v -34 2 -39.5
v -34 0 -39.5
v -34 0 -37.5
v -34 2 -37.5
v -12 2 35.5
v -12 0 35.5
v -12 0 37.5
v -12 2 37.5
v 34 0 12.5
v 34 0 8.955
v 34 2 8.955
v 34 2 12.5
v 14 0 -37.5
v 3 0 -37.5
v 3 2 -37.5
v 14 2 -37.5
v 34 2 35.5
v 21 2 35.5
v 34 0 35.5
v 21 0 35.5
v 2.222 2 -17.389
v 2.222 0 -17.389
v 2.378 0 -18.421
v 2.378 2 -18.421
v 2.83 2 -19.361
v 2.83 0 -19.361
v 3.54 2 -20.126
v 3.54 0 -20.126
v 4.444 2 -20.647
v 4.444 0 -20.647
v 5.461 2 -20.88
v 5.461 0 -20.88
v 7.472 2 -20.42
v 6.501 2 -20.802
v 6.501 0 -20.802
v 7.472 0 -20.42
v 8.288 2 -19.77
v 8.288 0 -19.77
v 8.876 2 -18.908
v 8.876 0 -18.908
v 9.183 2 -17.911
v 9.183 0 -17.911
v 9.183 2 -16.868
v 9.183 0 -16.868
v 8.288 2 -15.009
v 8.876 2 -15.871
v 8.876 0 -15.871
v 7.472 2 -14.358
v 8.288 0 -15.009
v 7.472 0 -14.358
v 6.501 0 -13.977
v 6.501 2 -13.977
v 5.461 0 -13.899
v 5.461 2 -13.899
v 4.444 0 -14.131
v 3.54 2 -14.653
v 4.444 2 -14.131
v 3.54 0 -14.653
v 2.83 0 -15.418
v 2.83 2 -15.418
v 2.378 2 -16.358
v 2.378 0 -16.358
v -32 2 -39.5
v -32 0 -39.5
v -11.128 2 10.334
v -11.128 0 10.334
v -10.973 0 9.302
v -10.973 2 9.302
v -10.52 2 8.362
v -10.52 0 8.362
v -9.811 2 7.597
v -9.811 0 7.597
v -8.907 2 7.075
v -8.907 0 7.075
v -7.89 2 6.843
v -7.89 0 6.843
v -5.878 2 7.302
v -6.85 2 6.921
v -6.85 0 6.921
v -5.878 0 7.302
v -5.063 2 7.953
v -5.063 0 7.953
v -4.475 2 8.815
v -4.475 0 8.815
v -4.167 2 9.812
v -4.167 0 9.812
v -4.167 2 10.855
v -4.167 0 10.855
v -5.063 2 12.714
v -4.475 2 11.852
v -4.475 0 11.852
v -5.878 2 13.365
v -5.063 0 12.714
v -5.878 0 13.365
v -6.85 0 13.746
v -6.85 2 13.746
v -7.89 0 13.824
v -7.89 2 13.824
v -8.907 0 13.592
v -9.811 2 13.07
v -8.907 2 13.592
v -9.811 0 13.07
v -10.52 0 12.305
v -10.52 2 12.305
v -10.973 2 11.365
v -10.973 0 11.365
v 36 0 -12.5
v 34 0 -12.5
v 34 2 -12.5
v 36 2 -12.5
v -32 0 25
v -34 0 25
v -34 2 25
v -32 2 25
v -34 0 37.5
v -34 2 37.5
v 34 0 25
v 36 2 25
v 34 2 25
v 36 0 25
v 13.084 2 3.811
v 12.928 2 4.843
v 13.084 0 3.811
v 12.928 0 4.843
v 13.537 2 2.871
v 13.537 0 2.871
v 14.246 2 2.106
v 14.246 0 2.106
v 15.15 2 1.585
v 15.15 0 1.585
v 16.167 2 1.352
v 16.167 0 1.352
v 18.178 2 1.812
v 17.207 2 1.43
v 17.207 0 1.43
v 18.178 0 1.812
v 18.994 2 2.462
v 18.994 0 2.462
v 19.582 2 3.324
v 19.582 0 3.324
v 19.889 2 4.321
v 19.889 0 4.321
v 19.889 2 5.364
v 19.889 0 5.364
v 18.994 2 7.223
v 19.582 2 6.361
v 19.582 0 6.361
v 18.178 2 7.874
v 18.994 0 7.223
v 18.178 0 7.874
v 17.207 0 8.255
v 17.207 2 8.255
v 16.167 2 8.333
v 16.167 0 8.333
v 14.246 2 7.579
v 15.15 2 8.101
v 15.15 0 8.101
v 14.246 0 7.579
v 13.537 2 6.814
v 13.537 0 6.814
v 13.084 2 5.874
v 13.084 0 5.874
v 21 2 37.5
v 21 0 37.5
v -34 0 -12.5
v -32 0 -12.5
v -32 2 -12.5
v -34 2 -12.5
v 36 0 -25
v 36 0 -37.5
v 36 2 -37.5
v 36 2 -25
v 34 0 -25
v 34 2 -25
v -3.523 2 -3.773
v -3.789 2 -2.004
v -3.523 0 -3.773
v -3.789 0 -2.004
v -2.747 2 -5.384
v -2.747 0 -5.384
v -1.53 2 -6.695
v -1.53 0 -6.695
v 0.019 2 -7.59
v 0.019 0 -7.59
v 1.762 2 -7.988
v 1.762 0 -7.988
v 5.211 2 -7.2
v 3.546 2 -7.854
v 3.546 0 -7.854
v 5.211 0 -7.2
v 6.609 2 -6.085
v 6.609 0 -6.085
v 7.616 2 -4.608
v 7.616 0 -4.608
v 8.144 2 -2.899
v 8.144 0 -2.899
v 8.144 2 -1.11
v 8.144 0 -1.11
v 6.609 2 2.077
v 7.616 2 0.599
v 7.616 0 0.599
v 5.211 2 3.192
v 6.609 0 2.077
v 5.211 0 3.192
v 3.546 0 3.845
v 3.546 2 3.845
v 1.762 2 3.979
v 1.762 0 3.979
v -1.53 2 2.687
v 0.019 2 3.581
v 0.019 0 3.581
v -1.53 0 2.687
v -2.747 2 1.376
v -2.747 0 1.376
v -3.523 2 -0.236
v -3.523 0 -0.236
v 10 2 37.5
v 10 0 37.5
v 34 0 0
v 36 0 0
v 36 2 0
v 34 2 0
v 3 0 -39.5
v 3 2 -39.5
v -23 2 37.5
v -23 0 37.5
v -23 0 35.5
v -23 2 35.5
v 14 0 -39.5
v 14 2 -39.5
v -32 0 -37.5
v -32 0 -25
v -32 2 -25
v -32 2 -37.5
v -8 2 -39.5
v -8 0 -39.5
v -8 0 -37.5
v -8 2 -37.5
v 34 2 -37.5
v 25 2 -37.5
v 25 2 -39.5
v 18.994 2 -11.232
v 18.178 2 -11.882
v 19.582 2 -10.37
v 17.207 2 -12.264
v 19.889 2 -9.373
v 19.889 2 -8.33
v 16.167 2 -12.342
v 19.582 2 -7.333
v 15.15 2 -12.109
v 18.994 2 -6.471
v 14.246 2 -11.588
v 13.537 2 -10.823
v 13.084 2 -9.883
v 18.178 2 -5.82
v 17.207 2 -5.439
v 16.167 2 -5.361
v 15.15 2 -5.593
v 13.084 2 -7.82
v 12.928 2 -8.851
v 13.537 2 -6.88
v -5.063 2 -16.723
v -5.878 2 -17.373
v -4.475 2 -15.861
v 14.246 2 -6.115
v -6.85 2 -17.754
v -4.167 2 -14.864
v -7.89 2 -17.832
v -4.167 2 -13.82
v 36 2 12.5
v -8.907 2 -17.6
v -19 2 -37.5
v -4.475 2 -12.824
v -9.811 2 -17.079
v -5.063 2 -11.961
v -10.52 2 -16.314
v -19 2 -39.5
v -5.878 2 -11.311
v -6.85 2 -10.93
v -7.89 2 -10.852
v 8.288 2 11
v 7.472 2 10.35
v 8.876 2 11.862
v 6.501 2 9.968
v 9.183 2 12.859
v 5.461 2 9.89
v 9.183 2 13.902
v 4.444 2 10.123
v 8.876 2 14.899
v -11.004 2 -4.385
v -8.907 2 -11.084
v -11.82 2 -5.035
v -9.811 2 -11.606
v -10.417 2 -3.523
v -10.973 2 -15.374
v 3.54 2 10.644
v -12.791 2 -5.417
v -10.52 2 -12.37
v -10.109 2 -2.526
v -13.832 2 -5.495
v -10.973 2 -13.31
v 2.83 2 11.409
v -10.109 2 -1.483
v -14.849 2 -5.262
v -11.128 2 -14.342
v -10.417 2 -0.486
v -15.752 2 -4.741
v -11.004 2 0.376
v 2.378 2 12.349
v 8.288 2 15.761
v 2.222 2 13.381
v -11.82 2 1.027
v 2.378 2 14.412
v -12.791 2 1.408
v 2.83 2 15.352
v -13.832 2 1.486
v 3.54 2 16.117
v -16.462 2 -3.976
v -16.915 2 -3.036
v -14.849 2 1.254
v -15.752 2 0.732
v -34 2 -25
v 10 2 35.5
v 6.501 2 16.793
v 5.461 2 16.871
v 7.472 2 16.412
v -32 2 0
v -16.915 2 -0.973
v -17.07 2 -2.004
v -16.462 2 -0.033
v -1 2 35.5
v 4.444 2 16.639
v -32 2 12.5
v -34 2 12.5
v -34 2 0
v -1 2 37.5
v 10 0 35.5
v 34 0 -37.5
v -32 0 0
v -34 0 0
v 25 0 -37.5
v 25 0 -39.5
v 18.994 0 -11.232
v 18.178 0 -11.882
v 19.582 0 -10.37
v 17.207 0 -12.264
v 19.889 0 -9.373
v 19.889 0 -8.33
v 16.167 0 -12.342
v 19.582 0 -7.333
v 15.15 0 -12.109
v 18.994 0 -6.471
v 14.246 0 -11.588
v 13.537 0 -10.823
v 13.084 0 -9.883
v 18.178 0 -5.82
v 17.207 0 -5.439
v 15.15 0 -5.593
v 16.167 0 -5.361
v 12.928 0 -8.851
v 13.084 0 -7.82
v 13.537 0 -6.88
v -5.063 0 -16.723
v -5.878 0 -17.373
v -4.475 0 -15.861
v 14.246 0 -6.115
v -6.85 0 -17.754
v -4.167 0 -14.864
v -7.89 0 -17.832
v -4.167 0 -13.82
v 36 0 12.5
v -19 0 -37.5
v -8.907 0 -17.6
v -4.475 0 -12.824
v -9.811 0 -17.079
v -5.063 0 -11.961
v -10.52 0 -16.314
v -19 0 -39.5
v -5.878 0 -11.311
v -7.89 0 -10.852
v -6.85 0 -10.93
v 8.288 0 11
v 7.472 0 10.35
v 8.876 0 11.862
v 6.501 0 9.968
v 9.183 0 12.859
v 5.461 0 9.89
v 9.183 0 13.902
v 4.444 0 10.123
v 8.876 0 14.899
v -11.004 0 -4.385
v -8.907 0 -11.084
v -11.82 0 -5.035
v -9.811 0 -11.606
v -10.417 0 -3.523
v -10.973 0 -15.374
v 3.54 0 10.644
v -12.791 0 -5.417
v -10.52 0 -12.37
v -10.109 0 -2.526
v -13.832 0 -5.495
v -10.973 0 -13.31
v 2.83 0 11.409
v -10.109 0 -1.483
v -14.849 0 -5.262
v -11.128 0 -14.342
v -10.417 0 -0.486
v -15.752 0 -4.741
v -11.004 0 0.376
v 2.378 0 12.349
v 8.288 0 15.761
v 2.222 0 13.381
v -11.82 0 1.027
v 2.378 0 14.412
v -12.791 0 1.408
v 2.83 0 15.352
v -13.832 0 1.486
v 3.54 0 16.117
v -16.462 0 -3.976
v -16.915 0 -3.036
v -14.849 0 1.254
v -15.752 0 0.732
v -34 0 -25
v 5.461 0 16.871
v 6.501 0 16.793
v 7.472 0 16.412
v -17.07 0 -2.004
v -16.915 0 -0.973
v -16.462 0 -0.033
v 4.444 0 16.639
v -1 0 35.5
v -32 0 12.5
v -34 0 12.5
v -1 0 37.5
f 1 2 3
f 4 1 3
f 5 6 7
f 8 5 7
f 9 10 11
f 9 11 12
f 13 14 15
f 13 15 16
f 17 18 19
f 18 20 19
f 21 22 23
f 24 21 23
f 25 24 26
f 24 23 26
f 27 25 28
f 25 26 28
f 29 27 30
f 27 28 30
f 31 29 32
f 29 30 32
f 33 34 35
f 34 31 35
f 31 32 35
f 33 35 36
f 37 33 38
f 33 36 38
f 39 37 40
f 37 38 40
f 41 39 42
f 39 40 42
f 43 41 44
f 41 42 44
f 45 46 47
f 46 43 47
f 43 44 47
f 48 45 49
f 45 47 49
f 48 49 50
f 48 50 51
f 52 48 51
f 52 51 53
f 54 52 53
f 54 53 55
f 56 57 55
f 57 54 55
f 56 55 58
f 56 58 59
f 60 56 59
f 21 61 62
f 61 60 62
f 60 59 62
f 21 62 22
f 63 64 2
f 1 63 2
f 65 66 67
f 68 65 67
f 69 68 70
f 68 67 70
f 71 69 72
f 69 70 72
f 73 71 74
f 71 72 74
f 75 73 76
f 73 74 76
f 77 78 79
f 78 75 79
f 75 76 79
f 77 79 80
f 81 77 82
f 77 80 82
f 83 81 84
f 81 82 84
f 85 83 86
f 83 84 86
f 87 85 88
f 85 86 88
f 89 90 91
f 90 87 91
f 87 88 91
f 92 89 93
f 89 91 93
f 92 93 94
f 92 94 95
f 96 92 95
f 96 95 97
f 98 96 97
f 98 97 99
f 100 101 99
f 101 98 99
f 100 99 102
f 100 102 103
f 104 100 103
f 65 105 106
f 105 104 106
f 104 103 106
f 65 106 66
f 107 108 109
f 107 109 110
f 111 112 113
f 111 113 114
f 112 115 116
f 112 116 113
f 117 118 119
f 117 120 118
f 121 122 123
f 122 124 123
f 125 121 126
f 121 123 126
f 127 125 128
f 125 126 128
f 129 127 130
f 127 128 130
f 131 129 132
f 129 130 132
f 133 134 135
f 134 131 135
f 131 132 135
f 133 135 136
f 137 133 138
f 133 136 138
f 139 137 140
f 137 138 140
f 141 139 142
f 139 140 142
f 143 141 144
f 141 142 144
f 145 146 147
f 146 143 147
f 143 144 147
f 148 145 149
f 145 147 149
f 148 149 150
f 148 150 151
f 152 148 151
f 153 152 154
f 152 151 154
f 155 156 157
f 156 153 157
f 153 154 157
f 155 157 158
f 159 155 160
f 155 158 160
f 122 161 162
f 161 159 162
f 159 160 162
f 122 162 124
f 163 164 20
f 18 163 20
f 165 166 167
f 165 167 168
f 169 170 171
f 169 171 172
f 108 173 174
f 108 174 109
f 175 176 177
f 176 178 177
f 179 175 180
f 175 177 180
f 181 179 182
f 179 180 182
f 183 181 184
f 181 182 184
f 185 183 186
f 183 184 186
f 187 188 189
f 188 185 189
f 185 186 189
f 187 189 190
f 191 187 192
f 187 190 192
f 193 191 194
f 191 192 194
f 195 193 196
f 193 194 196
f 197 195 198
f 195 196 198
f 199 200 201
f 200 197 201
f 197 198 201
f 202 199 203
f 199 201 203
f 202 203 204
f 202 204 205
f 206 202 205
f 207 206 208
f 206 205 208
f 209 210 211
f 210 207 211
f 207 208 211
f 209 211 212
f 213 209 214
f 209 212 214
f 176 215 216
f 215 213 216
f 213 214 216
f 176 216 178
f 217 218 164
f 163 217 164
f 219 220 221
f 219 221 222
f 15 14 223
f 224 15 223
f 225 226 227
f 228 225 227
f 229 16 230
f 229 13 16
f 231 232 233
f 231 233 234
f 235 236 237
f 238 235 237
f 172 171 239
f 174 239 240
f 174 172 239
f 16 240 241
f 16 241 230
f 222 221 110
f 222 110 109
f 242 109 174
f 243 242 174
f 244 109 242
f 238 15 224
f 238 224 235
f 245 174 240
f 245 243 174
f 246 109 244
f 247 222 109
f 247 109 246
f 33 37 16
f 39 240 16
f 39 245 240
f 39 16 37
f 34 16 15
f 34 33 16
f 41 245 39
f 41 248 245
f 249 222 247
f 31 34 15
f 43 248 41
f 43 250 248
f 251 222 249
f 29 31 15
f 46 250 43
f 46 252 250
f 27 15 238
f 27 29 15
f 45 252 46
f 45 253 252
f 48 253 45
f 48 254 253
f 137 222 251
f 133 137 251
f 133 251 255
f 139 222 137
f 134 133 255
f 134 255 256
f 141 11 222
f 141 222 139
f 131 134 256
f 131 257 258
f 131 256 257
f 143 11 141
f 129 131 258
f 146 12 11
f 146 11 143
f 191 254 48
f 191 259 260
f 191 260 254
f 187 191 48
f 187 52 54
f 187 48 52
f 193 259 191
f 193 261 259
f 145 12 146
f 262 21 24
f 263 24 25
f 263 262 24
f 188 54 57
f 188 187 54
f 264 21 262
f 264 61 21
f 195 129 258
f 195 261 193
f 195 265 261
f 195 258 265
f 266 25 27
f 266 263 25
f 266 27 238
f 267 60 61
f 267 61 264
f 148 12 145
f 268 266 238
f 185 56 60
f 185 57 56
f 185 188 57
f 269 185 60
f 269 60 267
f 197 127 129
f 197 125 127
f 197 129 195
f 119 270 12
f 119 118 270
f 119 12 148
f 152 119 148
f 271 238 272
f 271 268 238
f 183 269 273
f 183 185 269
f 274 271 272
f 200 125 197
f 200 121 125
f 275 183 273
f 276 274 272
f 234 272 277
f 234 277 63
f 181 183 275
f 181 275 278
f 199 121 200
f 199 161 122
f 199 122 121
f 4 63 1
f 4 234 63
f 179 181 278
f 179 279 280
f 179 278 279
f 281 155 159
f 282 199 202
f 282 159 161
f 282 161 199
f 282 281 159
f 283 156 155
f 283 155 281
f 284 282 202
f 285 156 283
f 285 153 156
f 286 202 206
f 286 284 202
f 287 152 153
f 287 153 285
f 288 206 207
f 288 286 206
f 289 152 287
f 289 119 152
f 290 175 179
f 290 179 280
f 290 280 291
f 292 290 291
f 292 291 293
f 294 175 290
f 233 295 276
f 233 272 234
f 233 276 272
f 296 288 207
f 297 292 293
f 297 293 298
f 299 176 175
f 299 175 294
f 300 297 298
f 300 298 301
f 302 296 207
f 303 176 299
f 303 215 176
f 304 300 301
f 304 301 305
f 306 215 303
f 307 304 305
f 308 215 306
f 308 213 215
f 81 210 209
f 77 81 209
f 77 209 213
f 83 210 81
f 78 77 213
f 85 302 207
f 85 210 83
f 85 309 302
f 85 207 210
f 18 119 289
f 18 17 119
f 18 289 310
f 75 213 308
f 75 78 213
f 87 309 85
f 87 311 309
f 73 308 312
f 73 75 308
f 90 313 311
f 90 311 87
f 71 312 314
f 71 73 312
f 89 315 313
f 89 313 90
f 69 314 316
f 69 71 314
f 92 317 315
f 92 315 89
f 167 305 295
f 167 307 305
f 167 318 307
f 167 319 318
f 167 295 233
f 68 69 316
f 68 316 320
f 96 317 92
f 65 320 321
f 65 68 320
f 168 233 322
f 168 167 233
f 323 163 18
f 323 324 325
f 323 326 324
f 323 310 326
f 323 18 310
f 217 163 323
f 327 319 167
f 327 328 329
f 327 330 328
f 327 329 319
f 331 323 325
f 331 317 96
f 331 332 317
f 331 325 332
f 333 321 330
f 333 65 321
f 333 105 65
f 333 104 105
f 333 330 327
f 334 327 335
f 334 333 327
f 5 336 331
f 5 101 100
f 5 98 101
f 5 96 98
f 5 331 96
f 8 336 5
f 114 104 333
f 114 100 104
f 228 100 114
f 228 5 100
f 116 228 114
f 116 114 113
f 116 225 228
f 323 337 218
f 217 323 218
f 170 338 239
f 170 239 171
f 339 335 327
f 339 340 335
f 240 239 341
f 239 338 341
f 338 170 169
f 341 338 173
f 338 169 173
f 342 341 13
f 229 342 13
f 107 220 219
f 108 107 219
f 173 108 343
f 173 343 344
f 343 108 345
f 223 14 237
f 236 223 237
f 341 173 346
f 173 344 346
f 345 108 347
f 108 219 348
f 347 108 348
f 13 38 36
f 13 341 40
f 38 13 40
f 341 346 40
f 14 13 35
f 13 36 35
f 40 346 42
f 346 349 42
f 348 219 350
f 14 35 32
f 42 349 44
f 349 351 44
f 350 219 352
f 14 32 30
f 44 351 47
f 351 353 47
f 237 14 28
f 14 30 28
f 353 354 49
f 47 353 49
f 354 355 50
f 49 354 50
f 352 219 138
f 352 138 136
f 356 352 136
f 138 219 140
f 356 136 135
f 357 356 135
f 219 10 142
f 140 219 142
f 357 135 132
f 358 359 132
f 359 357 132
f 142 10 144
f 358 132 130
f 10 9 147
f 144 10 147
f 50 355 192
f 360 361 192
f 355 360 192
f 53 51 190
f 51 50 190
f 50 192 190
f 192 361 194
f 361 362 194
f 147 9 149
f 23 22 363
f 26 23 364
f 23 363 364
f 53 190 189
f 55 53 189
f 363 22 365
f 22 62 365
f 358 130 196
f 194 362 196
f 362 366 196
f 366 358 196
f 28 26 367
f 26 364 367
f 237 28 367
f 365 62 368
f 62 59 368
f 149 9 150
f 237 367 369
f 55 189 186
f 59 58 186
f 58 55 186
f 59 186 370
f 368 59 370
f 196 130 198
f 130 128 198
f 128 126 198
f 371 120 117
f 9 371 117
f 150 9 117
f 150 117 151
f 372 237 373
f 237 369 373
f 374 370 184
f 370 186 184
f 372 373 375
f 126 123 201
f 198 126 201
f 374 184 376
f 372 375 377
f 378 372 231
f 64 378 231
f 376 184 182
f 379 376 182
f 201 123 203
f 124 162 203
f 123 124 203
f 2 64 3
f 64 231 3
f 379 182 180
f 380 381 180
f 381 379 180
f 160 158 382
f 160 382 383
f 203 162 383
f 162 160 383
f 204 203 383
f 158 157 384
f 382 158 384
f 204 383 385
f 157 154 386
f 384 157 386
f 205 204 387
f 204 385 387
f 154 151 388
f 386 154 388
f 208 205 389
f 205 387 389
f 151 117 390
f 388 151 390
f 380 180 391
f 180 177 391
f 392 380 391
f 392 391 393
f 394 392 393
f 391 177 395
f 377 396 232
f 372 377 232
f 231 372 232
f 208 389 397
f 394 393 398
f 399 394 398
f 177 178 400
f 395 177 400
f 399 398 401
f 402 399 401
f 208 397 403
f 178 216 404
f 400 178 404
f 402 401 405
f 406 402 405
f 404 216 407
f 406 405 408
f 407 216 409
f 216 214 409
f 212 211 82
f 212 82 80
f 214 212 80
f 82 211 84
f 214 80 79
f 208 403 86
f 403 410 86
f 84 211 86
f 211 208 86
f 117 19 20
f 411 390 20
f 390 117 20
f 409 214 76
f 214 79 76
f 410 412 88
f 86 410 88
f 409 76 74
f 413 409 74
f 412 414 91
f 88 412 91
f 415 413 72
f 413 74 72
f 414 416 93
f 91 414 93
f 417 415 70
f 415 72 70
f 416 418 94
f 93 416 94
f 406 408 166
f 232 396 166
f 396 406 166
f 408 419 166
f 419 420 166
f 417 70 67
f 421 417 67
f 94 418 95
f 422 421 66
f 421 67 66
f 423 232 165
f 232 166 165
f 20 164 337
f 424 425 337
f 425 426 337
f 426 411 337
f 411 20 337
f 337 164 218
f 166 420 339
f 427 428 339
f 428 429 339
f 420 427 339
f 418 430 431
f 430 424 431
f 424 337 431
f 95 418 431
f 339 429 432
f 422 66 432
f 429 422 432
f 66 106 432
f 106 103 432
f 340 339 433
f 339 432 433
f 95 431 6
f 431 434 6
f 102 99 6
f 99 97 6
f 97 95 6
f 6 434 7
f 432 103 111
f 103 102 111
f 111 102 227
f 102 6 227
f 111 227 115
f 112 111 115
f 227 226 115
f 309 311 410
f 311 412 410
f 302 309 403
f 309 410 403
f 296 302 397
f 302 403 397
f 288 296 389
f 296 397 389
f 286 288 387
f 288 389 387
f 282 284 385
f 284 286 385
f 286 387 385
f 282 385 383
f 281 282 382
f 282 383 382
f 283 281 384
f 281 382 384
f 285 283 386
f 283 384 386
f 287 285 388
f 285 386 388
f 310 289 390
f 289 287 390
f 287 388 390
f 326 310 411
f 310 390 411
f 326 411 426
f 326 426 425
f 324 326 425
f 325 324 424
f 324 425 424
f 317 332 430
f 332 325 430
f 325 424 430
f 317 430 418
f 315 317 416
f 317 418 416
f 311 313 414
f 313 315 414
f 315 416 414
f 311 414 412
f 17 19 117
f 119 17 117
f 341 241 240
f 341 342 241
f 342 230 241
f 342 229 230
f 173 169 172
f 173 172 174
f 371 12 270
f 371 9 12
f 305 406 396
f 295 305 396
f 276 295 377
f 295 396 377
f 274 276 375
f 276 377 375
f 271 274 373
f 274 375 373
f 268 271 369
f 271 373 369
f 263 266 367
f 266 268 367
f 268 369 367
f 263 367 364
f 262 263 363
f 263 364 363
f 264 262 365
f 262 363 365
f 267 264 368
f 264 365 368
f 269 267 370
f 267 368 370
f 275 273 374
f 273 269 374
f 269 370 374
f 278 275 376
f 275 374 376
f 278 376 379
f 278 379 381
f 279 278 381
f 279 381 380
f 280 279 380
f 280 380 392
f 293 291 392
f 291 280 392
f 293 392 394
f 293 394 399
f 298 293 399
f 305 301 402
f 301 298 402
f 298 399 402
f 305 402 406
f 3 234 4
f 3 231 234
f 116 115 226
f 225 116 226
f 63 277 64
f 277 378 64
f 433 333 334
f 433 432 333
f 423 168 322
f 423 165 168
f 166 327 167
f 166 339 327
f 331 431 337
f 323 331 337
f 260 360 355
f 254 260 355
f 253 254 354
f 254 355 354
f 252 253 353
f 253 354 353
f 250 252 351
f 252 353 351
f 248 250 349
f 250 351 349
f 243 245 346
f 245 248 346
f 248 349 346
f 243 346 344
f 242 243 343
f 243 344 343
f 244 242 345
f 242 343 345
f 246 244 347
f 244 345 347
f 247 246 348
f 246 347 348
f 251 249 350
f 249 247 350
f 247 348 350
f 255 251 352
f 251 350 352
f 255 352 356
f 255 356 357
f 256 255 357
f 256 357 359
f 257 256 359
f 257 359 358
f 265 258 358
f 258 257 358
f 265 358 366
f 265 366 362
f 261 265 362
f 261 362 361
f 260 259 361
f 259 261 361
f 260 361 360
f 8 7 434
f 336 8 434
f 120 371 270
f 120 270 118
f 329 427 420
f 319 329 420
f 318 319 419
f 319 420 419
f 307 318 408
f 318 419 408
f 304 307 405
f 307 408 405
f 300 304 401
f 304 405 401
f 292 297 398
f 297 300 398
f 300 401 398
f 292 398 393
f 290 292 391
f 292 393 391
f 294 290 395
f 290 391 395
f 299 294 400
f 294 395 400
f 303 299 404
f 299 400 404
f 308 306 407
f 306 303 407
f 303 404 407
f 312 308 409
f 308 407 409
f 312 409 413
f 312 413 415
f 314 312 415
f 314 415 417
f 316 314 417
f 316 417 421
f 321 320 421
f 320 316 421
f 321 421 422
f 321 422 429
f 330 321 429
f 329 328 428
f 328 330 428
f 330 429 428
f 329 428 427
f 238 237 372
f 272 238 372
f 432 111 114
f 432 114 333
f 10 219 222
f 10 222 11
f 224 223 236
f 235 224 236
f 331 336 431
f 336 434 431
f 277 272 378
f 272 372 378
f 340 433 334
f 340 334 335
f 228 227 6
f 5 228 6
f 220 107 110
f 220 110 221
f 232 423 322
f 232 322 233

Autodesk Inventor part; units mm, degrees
ref_plane "YZ Plane" through (0, 0, 0) normal (1, 0, 0) x (0, 1, 0)
ref_plane "XZ Plane" through (0, 0, 0) normal (0, 1, 0) x (-1, 0, 0)
ref_plane "XY Plane" through (0, 0, 0) normal (0, 0, 1) x (1, 0, 0)
sketch "Sketch1" plane through (0, 0, 0) normal (0, 1, 0) x (-1, 0, 0)
  line L0 (34, 37.5) -> (-34, -37.5) construction
  line L1 (-34, 37.5) -> (34, -37.5) construction
  line L2 (34, 37.5) -> (34, 25)
  line L3 (34, 25) -> (32, 25)
  line L4 (32, 25) -> (32, 12.5)
  line L5 (32, 12.5) -> (34, 12.5)
  line L6 (34, 12.5) -> (34, 0)
  line L7 (34, 0) -> (32, 0)
  line L8 (32, 0) -> (32, -12.5)
  line L9 (32, -12.5) -> (34, -12.5)
  line L10 (34, -12.5) -> (34, -25)
  line L11 (34, -25) -> (32, -25)
  line L12 (32, -25) -> (32, -37.5)
  line L13 (34, -25) -> (34, -12.5)
  line L14 (34, 0) -> (34, 12.5)
  line L15 (34, 25) -> (34, 37.5)
  line L16 (-3, -37.5) -> (-14, -37.5)
  line L17 (-14, -37.5) -> (-14, -39.5)
  line L18 (-14, -39.5) -> (-25, -39.5)
  line L19 (-25, -39.5) -> (-25, -37.5)
  line L20 (-34, -37.5) -> (-36, -37.5)
  line L21 (-36, -37.5) -> (-36, -25)
  line L22 (-36, -25) -> (-34, -25)
  line L23 (-34, -25) -> (-34, -12.5)
  line L24 (-34, -12.5) -> (-36, -12.5)
  line L25 (-36, -12.5) -> (-36, 0)
  line L26 (-36, 0) -> (-34, 0)
  line L27 (-34, 0) -> (-34, 12.5)
  line L28 (-34, 12.5) -> (-34, 8.9552)
  line L29 (-34, 12.5) -> (-36, 12.5)
  line L30 (-36, 12.5) -> (-36, 25)
  line L31 (-36, 25) -> (-34, 25)
  line L32 (-34, -37.5) -> (-25, -37.5)
  line L33 (-14, -37.5) -> (-3, -37.5)
  line L34 (-34, -12.5) -> (-34, -25)
  line L35 (-34, 35.5) -> (-34, 25)
  line L36 (-34, 12.5) -> (-34, 0)
  line L37 (34, 37.5) -> (23, 37.5)
  line L38 (23, 37.5) -> (23, 35.5)
  line L39 (23, 35.5) -> (12, 35.5)
  line L40 (12, 35.5) -> (12, 37.5)
  line L41 (12, 37.5) -> (1, 37.5)
  line L42 (1, 37.5) -> (1, 35.5)
  line L43 (1, 35.5) -> (-10, 35.5)
  line L44 (-10, 35.5) -> (-10, 37.5)
  line L45 (-10, 37.5) -> (-21, 37.5)
  line L46 (-21, 37.5) -> (-21, 35.5)
  line L47 (-21, 35.5) -> (-34, 35.5)
  line L48 (34, 37.5) -> (23, 37.5)
  line L49 (12, 37.5) -> (1, 37.5)
  line L50 (-10, 37.5) -> (-21, 37.5)
  circle A0 centre (-2.2106, -2.0043) radius 6
  circle A1 centre (13.57, -2.0043) radius 3.5
  circle A2 centre (7.6284, 10.3335) radius 3.5
  circle A3 centre (-5.7222, 13.3806) radius 3.5
  circle A4 centre (-16.4285, 4.8426) radius 3.5
  circle A5 centre (-16.4285, -8.8513) radius 3.5
  circle A6 centre (-5.7222, -17.3893) radius 3.5
  circle A7 centre (7.6284, -14.3421) radius 3.5
  line L51 (-3, -37.5) -> (-3, -39.5)
  line L52 (-3, -39.5) -> (8, -39.5)
  line L53 (8, -39.5) -> (8, -37.5)
  line L54 (8, -37.5) -> (19, -37.5)
  line L55 (19, -37.5) -> (19, -39.5)
  line L56 (19, -39.5) -> (32, -39.5)
  line L57 (32, -39.5) -> (34, -39.5)
  line L58 (34, -39.5) -> (34, -37.5)
  line L59 (32, -37.5) -> (34, -37.5)
  point P0 (0, 0)
  point P1 (0, 0)
  point P2 (8.5, -39.5)
  point P3 (-2.5, -39.5)
  dimension "d1" = 75
  dimension "d2" = 2
  dimension "d3" = 12.5
  dimension "d4" = 12.5
  dimension "d5" = 12.5
  dimension "d6" = 12.5
  dimension "d7" = 2
  dimension "d13" = 11
  dimension "d14" = 2
  dimension "d15" = 12.5
  dimension "d16" = 12.5
  dimension "d17" = 2
  dimension "d18" = 12.5
  dimension "d19" = 12.5
  dimension "d20" = 2
  dimension "d21" = 12.5
  dimension "d22" = 11
  dimension "d23" = 11
  dimension "d24" = 11
  dimension "d25" = 11
  dimension "d28" = 12
  dimension "d29" = 7
  dimension "d30" = 360
  dimension "d33" = 9
  dimension "d34" = 11
  dimension "d35" = 11
  dimension "d36" = 2
  dimension "d37" = 11
extrude "Extrusion1" add sketch "Sketch1" along normal blind 2
properties part number "KIRI"
